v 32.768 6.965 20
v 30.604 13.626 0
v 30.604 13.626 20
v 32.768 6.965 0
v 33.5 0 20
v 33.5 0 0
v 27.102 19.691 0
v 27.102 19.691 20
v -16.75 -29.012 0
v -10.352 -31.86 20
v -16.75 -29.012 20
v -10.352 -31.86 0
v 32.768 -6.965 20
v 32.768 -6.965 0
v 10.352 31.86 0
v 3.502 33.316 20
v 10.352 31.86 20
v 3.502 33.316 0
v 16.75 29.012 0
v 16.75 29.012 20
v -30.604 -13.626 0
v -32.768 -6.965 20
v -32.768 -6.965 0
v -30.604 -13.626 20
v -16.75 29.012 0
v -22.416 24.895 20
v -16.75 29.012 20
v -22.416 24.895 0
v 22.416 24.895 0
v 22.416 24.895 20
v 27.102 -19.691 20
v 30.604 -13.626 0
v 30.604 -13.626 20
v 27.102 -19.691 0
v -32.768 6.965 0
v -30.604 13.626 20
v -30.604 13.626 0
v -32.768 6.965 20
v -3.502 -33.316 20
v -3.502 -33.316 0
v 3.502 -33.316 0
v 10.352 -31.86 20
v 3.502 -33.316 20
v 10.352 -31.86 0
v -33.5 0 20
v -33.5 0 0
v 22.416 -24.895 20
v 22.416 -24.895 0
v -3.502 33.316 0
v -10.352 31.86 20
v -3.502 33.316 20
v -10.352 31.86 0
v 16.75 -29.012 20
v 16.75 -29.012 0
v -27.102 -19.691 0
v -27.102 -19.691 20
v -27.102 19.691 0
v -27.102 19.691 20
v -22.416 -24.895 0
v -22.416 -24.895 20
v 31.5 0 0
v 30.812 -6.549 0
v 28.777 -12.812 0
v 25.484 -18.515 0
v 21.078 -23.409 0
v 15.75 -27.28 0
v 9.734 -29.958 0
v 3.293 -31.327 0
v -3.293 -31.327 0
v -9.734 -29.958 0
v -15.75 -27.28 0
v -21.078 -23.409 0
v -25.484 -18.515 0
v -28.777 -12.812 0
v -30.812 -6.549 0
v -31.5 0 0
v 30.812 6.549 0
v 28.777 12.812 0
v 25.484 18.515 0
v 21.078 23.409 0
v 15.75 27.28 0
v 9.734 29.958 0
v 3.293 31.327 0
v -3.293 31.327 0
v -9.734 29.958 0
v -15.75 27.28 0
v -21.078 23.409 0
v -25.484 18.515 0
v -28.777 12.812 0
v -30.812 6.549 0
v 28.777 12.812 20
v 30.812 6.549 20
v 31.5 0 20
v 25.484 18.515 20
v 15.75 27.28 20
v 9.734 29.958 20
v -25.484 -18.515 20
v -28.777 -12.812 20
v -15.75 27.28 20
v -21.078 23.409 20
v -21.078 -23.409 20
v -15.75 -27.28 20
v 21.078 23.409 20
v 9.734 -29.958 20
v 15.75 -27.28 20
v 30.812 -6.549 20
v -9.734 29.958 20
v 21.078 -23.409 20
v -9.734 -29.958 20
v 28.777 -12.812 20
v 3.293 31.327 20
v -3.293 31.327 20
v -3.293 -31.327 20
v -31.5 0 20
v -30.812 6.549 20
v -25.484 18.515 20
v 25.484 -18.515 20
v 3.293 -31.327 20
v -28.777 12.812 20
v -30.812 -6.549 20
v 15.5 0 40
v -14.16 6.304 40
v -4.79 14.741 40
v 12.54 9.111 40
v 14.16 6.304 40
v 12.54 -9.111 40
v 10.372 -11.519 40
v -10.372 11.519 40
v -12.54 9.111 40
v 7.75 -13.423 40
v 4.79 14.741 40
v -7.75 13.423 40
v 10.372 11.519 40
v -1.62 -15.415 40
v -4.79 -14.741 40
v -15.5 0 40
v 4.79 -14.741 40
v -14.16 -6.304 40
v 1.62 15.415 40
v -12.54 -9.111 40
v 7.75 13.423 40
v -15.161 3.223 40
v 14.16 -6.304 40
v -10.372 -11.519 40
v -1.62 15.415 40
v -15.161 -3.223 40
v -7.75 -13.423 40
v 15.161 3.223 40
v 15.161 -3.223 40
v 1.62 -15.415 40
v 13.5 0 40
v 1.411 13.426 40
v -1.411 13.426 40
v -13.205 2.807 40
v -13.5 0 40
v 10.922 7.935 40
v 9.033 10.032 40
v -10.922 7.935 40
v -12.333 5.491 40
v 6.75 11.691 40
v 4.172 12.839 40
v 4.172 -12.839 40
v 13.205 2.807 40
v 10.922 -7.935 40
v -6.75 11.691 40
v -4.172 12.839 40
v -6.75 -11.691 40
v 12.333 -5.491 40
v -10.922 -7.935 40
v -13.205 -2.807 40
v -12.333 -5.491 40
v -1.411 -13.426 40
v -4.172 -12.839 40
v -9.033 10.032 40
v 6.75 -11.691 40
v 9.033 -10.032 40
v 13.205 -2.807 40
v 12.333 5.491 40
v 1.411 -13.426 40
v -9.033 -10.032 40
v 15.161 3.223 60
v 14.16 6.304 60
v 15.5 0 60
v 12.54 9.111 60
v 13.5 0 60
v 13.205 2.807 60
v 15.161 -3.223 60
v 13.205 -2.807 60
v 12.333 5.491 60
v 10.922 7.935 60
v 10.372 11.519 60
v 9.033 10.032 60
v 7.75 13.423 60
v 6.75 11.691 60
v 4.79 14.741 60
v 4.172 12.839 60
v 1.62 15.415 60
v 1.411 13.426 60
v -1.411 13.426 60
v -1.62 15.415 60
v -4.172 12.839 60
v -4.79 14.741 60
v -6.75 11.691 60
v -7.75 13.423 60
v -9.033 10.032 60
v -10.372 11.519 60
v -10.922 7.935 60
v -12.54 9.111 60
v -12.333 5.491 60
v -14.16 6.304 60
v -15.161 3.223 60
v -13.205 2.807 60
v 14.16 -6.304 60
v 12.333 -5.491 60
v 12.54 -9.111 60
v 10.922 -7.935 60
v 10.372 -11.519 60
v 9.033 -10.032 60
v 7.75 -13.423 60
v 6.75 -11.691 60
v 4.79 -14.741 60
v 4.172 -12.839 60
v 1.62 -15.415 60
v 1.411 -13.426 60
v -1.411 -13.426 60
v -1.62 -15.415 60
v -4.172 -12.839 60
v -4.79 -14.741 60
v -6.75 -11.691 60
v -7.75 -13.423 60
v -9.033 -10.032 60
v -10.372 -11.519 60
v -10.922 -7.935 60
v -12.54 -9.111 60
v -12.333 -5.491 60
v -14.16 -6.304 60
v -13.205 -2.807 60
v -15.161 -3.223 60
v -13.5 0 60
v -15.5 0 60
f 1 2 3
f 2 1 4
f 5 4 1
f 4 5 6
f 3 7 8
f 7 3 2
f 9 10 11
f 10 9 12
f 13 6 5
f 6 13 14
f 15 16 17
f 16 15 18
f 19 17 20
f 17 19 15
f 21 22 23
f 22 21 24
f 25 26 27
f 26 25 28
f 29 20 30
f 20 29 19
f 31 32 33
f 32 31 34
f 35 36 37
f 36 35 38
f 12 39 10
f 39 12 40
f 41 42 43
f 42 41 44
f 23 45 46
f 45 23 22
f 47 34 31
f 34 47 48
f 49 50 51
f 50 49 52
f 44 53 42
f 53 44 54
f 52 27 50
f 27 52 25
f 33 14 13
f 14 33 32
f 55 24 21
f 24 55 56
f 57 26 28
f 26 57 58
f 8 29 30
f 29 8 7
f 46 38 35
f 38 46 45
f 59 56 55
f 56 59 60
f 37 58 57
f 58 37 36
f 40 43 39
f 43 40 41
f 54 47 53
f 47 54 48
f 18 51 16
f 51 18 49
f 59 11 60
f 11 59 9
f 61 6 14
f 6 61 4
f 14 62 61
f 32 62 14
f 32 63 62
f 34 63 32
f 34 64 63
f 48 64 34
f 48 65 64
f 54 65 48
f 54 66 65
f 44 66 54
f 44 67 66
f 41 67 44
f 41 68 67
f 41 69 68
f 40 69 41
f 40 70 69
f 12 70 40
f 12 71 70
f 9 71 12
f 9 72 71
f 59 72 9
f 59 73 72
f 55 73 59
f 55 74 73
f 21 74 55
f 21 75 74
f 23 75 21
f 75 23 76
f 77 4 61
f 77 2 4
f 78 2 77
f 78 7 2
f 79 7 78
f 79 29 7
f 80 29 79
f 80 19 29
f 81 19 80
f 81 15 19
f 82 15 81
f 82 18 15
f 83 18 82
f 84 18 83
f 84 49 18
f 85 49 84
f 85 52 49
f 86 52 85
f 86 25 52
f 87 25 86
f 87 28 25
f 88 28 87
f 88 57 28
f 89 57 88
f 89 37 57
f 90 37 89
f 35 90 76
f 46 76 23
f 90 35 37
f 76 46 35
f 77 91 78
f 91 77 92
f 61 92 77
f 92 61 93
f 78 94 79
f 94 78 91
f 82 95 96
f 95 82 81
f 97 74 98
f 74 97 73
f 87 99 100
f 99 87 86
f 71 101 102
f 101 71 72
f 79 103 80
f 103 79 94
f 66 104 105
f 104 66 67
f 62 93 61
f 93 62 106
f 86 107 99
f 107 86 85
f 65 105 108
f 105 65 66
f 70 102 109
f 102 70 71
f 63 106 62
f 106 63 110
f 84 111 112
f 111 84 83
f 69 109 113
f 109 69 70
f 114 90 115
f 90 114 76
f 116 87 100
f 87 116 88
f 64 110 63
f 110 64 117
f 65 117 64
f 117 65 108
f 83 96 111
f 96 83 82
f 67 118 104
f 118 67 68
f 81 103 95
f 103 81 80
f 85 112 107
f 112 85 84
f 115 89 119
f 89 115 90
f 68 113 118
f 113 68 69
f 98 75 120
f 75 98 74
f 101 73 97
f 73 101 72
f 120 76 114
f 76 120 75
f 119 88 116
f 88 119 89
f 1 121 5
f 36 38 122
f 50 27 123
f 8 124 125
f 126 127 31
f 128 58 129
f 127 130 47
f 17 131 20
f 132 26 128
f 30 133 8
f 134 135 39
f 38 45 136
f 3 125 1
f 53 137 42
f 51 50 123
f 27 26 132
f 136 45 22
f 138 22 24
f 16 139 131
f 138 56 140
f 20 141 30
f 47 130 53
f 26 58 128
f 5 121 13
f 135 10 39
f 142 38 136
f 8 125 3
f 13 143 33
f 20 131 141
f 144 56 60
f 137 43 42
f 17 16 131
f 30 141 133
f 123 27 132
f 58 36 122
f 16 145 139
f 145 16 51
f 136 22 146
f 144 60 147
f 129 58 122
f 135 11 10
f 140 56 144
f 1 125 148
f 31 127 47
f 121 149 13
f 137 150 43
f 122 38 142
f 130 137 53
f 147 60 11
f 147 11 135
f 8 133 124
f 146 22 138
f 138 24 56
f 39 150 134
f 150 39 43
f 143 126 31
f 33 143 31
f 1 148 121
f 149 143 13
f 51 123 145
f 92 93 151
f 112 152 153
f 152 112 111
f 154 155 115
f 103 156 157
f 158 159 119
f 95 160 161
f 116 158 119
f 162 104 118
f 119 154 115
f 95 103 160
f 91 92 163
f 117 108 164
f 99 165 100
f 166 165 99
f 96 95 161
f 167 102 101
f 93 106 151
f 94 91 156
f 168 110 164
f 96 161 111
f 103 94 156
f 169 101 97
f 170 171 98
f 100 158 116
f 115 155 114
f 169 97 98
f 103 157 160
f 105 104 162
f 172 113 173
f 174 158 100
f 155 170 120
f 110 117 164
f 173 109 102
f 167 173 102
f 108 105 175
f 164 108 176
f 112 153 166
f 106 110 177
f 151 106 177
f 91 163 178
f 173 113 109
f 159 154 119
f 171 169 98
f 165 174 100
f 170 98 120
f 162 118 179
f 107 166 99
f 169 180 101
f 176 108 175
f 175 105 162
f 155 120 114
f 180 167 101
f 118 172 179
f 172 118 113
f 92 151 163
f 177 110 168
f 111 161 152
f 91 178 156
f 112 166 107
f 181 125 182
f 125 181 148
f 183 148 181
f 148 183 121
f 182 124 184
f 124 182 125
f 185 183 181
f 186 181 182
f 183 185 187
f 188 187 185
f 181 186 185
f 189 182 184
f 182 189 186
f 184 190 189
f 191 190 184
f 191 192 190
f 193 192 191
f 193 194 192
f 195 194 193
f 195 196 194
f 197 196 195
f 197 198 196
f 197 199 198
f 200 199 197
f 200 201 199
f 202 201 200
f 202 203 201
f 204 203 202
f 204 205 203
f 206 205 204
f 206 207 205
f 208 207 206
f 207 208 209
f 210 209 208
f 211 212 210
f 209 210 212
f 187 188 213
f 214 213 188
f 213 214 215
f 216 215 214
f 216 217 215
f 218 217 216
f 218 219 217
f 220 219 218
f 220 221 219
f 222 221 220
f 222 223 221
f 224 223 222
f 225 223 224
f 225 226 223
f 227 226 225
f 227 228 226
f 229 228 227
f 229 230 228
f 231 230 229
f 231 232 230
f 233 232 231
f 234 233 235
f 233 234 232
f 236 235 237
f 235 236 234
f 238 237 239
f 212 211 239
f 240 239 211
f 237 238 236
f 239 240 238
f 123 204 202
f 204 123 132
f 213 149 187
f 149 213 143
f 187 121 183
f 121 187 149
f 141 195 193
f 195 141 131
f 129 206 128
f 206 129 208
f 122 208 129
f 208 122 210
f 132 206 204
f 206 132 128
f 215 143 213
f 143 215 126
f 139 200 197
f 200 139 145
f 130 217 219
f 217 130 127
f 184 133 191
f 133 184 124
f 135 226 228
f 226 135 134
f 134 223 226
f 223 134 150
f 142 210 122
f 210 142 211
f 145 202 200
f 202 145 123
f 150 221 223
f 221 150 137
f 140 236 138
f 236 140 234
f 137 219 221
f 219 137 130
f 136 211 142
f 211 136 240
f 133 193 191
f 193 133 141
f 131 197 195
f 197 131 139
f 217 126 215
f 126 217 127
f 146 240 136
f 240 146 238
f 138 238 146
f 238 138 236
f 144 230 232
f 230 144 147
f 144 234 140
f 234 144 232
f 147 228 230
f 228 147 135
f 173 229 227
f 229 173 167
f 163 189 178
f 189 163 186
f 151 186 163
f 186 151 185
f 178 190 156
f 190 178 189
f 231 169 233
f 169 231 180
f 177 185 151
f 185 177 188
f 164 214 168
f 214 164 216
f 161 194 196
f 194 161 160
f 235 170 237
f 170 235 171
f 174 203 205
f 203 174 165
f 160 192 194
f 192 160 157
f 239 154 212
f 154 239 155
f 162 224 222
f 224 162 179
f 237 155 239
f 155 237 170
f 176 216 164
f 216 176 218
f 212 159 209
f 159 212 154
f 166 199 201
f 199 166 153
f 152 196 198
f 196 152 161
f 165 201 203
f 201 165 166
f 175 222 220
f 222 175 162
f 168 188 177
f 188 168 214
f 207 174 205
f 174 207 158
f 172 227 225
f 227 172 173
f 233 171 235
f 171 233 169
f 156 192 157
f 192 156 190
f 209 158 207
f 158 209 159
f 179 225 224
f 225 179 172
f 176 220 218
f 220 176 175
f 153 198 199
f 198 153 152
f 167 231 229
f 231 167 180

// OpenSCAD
vacuumInner = 31;
sanderOuter = 63;

barrel = 20;

thickness = 2;


difference() {
    cylinder(h=barrel, d=sanderOuter+2*thickness);
    cylinder(h=barrel, d=sanderOuter);
}

translate([0, 0, barrel])
difference() {
    cylinder(h=barrel, d1=sanderOuter+2*thickness, d2=vacuumInner);
    cylinder(h=barrel, d1=sanderOuter, d2=vacuumInner-2*thickness);
}

translate([0, 0, 2*barrel])
difference() {
    cylinder(h=barrel, d=vacuumInner);
    cylinder(h=barrel, d=vacuumInner-2*thickness);
}
